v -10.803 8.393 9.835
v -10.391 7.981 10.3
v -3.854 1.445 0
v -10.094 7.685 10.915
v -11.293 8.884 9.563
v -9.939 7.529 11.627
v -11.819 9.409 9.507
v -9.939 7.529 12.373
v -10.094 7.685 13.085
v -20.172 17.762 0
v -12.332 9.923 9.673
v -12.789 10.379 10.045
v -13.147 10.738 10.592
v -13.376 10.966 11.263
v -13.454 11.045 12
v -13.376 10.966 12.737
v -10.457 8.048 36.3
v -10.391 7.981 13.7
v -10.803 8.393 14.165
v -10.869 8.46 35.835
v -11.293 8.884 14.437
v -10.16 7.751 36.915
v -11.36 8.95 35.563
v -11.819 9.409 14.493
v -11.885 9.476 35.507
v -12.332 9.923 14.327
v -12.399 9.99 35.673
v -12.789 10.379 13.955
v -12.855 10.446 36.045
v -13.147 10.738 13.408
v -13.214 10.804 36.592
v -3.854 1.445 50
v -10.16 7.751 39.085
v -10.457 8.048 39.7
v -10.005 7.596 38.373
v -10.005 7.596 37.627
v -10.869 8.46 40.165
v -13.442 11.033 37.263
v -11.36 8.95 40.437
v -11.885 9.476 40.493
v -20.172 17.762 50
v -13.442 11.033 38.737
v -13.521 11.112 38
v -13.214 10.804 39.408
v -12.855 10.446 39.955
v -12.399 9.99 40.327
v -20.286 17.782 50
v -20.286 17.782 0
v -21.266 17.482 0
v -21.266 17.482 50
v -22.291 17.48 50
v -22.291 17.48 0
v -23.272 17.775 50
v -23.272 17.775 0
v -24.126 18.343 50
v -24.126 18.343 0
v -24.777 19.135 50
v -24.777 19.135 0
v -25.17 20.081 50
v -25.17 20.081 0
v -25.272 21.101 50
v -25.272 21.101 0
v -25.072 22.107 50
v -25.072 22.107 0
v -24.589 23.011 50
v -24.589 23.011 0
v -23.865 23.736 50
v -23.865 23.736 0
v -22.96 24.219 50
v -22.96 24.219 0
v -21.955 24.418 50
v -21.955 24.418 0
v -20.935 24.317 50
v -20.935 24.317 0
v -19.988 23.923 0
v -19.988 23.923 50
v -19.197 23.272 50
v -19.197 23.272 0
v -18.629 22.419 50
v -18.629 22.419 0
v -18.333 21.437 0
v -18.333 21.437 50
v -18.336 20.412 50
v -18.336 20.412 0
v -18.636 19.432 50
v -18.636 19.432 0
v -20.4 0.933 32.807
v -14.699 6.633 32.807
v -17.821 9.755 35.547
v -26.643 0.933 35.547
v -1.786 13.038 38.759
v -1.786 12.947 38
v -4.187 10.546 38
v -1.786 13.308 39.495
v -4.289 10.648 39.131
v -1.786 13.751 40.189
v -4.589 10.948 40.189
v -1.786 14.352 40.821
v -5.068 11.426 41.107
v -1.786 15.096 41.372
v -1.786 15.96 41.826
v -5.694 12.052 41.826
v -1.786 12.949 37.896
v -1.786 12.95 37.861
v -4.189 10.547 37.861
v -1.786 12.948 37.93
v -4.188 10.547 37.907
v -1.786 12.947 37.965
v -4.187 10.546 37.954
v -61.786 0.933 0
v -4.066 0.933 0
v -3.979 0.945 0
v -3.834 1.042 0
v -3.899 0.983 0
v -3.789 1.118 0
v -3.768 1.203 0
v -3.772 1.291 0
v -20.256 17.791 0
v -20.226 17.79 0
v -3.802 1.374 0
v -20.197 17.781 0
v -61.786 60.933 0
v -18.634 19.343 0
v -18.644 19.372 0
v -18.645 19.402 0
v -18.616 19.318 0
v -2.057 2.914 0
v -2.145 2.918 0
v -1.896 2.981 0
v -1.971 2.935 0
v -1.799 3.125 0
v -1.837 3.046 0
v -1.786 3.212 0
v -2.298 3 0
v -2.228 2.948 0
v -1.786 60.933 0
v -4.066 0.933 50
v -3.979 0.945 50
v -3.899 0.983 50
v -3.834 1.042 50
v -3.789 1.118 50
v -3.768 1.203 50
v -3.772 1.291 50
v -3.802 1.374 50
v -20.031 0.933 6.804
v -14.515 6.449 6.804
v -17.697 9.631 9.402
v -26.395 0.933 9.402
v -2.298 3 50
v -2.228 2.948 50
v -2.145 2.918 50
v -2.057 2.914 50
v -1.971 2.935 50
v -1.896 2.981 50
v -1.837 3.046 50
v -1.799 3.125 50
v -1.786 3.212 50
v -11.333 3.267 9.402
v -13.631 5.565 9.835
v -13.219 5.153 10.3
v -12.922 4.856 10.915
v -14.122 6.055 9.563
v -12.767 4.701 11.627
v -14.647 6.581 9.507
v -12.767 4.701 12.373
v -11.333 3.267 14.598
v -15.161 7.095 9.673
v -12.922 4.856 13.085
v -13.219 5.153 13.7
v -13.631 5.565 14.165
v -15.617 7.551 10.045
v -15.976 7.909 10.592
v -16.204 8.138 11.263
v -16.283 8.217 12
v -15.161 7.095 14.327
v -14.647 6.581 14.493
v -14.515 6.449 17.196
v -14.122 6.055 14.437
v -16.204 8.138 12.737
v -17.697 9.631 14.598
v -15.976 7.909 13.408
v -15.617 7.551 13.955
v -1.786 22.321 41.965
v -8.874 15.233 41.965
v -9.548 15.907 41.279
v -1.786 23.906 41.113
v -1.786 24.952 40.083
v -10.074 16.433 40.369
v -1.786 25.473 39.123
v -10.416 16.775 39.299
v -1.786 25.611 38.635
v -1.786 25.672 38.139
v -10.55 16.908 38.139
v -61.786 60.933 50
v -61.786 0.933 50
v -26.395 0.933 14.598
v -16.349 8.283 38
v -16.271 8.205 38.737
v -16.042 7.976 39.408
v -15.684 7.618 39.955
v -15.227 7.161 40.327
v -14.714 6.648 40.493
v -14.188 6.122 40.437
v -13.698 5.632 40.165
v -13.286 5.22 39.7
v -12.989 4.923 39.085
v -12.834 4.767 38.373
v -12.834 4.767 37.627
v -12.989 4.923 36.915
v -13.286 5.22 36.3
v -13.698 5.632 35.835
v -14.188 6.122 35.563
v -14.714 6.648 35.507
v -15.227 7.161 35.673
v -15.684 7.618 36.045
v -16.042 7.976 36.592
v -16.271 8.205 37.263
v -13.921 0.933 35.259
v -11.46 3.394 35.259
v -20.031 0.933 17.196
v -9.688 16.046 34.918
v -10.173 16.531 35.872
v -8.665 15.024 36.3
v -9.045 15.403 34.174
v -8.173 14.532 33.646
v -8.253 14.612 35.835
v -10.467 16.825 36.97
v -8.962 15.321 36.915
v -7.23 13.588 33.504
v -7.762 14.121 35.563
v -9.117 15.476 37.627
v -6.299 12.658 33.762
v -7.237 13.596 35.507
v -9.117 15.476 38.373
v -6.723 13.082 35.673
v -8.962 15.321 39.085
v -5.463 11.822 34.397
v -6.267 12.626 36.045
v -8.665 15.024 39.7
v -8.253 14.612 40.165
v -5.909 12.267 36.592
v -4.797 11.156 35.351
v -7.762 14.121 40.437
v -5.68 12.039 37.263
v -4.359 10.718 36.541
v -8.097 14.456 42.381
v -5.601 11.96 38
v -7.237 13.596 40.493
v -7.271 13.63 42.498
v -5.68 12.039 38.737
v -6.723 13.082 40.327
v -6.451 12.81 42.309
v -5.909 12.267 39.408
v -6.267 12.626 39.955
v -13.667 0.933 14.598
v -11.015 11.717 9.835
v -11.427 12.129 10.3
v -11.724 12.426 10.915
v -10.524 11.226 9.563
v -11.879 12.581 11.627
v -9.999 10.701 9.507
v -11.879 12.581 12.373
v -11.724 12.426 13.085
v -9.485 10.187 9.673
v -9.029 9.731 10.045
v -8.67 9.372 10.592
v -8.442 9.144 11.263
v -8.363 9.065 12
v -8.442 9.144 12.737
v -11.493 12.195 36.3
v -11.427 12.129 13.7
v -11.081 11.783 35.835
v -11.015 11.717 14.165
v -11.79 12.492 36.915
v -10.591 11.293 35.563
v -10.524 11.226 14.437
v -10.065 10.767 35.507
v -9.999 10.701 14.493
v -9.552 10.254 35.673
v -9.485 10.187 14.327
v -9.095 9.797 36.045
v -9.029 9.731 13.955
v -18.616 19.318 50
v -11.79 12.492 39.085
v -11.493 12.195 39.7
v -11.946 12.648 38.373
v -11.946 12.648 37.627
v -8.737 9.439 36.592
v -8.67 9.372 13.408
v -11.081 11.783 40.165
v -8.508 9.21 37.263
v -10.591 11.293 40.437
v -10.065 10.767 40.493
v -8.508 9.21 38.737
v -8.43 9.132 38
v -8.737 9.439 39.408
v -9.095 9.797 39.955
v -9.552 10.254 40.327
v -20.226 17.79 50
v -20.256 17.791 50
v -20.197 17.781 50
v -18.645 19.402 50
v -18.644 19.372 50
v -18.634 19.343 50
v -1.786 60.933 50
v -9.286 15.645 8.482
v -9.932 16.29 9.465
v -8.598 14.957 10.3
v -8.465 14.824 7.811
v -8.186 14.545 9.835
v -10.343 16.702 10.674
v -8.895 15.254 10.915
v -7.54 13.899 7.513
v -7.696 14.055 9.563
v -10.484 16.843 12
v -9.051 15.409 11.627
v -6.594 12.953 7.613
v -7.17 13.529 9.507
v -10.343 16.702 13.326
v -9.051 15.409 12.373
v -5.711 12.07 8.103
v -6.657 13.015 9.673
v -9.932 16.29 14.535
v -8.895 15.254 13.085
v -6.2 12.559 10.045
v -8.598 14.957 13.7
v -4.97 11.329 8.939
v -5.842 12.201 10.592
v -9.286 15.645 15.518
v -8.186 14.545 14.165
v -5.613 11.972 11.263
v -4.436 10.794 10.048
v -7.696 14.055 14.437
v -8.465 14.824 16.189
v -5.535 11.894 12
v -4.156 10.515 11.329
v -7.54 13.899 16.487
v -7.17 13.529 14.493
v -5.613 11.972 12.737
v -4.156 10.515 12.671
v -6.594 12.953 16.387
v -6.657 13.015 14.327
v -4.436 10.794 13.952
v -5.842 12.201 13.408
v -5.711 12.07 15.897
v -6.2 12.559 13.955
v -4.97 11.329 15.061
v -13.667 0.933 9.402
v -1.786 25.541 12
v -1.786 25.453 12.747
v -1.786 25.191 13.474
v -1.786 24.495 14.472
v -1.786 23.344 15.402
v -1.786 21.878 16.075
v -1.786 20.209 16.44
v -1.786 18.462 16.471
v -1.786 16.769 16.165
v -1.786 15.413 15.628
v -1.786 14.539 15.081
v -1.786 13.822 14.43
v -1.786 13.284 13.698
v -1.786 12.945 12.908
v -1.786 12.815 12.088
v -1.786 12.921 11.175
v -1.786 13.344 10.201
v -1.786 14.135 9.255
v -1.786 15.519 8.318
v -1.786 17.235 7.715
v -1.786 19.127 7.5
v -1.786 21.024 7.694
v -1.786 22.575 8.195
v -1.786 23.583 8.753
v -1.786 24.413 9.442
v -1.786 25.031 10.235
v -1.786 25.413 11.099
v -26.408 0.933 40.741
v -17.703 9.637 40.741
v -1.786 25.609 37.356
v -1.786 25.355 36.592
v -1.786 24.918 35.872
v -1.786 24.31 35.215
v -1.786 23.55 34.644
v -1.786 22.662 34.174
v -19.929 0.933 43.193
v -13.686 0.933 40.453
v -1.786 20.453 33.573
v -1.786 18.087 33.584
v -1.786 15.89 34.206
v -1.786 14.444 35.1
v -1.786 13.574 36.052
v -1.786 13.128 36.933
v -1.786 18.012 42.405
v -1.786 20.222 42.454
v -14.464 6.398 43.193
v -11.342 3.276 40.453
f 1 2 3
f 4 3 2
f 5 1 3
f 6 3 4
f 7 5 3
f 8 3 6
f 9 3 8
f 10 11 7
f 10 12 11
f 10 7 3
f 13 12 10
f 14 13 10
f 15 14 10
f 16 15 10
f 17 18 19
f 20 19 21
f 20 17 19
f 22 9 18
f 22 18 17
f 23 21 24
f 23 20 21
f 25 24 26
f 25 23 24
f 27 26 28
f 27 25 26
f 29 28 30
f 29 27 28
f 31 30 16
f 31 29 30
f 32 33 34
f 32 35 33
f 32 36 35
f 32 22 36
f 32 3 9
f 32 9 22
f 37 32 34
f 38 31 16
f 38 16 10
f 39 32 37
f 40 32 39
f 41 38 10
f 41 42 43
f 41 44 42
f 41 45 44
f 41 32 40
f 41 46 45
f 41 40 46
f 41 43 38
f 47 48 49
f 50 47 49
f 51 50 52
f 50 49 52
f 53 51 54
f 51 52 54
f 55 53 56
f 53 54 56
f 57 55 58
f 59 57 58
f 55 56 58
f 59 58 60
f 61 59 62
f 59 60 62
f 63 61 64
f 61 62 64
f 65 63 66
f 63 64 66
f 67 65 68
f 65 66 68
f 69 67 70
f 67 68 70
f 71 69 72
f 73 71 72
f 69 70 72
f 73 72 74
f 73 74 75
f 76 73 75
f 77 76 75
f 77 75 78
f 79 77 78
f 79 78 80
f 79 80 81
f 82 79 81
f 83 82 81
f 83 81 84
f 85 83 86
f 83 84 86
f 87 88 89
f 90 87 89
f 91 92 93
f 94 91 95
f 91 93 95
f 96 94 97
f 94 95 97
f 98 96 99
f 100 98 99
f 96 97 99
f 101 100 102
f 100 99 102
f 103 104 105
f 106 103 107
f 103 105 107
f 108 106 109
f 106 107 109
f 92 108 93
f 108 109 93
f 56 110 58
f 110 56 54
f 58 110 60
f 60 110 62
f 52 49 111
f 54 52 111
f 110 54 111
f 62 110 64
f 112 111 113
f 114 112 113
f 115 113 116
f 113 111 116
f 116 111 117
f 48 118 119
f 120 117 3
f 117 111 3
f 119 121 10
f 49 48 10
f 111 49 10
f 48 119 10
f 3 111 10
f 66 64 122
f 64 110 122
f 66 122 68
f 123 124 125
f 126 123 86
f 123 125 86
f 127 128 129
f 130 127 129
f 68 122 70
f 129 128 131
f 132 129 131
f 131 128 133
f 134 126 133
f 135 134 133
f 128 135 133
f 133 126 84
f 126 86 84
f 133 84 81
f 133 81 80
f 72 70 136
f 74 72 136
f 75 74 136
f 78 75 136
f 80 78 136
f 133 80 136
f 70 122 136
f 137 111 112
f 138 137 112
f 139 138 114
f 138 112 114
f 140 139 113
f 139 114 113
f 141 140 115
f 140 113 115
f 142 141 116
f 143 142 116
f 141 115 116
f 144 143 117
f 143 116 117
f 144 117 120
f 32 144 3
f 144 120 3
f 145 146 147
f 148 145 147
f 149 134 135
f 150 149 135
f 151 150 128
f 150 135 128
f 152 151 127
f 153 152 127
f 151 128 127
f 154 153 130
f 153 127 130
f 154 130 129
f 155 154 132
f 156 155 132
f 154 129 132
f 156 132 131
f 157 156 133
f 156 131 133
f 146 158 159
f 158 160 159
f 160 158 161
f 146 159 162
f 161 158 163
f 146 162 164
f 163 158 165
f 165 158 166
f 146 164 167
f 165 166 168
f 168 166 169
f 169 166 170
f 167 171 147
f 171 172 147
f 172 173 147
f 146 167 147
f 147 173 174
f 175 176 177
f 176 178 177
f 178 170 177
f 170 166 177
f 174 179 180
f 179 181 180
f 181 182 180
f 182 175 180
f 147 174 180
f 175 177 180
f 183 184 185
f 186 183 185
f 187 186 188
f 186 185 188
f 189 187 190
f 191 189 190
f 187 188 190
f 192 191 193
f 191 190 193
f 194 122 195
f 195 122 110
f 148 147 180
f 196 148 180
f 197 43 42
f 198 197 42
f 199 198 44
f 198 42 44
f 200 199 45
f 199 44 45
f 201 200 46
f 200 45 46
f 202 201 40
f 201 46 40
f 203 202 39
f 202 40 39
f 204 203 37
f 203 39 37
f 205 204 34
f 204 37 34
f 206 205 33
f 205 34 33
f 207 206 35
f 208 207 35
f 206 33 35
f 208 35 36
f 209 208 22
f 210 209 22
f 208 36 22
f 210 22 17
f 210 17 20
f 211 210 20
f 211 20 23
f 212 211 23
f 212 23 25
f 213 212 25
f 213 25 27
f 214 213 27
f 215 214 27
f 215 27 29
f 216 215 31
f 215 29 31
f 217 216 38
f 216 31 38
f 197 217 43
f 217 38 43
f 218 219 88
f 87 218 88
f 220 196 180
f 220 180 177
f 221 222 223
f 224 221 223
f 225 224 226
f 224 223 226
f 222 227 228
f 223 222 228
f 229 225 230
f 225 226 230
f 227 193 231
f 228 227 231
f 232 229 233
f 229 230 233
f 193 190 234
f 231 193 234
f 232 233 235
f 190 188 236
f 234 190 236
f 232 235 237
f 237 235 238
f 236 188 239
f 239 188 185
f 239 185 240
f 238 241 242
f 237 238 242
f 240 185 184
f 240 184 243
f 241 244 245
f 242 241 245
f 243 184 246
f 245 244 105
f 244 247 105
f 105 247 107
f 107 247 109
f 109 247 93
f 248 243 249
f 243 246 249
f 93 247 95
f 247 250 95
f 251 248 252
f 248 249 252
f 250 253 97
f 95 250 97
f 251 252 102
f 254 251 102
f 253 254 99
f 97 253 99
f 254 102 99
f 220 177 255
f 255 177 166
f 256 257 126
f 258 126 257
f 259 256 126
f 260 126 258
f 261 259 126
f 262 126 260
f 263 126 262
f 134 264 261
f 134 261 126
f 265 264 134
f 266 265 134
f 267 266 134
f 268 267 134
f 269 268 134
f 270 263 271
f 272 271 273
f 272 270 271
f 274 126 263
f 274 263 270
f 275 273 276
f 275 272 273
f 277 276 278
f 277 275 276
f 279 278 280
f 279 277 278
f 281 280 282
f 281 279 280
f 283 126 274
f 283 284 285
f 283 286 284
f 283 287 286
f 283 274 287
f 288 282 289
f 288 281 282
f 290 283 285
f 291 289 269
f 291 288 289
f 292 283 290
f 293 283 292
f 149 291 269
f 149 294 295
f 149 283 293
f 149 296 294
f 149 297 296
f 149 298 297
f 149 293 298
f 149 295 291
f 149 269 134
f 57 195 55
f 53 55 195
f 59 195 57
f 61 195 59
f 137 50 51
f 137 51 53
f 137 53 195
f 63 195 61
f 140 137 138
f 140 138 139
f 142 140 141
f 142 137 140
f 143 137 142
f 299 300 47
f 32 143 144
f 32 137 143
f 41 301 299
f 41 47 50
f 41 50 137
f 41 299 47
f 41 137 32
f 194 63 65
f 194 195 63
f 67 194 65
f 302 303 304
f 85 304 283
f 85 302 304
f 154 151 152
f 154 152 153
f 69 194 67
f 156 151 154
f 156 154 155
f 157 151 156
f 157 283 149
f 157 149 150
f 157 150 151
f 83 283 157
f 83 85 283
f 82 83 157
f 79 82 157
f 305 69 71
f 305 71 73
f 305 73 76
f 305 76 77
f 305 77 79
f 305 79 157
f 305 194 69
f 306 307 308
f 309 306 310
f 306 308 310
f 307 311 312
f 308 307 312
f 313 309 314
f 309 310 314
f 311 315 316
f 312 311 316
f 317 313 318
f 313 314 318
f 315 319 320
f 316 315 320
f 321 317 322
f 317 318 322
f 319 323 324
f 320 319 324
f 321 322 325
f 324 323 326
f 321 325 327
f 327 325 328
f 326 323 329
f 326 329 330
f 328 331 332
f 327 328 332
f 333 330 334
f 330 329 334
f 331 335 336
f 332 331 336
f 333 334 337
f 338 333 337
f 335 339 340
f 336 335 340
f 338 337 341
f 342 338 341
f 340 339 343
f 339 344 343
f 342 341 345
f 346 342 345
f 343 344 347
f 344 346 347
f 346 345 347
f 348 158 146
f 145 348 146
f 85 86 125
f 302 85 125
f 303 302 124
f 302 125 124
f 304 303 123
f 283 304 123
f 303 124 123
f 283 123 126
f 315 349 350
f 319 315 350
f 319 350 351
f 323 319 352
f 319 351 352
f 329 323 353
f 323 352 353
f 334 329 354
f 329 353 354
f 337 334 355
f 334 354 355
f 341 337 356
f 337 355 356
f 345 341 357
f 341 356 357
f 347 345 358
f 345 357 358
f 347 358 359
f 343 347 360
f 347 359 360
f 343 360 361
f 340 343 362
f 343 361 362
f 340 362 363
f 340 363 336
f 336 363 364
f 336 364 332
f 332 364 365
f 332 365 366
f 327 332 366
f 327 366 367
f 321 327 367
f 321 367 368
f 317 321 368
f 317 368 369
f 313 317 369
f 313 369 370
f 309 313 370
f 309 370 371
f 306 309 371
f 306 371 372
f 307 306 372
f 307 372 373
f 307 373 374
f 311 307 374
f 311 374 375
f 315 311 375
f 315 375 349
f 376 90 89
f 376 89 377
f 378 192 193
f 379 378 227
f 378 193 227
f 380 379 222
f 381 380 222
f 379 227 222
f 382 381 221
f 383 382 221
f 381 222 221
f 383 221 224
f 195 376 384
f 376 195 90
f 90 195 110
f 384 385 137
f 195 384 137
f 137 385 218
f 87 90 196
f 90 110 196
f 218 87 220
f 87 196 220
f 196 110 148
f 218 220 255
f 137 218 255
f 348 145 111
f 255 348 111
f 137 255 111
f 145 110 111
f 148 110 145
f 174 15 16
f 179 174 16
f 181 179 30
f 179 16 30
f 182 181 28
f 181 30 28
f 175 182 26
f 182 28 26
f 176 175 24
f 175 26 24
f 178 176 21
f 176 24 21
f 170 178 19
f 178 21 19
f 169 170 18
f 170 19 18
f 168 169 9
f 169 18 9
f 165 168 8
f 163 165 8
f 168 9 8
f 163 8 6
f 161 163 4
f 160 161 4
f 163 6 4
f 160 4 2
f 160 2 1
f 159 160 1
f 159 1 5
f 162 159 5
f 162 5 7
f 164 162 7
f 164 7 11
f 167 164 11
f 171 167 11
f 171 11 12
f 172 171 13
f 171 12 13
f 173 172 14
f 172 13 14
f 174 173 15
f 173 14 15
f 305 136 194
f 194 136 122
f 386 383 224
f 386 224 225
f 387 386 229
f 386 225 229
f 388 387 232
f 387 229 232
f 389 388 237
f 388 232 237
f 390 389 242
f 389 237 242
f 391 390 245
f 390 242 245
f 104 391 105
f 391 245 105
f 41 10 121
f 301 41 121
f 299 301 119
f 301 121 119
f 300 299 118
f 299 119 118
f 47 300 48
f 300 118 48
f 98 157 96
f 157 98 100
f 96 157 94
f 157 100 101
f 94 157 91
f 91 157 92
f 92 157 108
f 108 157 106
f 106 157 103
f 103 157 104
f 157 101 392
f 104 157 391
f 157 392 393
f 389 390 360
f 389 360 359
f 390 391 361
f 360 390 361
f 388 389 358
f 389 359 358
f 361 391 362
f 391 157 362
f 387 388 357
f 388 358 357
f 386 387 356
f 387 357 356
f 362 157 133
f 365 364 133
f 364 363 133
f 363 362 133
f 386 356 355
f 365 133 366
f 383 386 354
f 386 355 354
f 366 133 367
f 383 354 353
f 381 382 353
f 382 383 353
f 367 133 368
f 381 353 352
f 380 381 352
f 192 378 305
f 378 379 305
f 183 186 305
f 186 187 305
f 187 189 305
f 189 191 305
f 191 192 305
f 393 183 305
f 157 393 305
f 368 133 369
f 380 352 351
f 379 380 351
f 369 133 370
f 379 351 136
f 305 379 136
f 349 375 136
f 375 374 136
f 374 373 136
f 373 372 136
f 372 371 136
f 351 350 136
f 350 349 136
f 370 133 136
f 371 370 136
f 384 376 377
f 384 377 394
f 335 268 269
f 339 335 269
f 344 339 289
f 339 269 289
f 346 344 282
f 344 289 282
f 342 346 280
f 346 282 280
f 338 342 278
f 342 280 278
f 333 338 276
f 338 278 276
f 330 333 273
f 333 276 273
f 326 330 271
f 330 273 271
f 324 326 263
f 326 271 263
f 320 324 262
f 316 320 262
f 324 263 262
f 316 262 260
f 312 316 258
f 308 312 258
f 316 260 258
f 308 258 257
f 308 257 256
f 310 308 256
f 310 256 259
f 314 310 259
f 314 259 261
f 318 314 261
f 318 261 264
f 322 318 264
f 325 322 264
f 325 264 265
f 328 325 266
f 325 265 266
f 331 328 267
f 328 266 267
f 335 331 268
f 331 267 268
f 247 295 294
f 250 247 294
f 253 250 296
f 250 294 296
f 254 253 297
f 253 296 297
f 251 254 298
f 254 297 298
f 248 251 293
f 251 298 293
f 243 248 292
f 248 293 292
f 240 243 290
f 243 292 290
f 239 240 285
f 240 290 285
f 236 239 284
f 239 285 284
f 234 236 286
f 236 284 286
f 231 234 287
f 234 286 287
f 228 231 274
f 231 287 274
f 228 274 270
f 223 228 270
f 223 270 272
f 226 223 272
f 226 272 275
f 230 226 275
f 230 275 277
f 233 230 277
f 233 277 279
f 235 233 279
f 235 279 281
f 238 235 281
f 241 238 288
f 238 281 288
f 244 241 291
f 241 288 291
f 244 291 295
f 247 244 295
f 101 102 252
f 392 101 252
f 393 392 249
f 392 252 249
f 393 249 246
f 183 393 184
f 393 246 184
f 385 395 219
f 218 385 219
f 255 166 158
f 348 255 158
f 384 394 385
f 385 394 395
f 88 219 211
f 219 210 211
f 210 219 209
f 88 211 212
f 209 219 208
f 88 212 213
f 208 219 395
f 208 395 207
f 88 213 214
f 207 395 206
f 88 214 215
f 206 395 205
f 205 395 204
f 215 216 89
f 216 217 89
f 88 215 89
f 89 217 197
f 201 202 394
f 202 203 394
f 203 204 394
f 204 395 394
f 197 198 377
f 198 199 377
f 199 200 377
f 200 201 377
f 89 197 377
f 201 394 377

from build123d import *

# Parameters (mm, degrees)
F1_DEPTH  = 50
F3_D      = 5
F3_DEPTH  = 41.3274068712
F4_D      = 5
F2_R      = 2.5
F5_DEPTH  = 25
F7_DEPTH  = 4
F8_D      = 5
F8_DEPTH  = 43.5274068712
F9_R      = 2.5
F10_DEPTH = 25
F11_DEPTH = 4
F12_D     = 9
F2_R_2    = 4.5
F13_DEPTH = 4
F14_DEPTH = 4


with BuildPart() as f1:
    # F0 (on Top) → F1 (new body)
    with BuildSketch(Plane.XY):
        with BuildLine():
            Line((-1.7862601951, 60.9325501156), (-61.7862601951, 60.9325501156))
            Line((-61.7862601951, 60.9325501156), (-61.7862601951, 0.9325501156))
            Line((-61.7862601951, 0.9325501156), (-4.0661591824, 0.9325501156))
            ThreePointArc((-4.0661591824, 0.9325501156), (-3.7889953226, 1.1177450859), (-3.854027148, 1.4446821499))
            Line((-3.854027148, 1.4446821499), (-20.1718328565, 17.7624878584))
            ThreePointArc((-20.1718328565, 17.7624878584), (-20.2255831505, 17.7903284125), (-20.2855480525, 17.7820579171))
            ThreePointArc((-20.2855480525, 17.7820579171), (-24.2538235709, 23.4001134914), (-18.6357679966, 19.431837973))
            ThreePointArc((-18.6357679966, 19.431837973), (-18.644038492, 19.371873071), (-18.6161979379, 19.318122777))
            Line((-18.6161979379, 19.318122777), (-2.2983922294, 3.0003170685))
            ThreePointArc((-2.2983922294, 3.0003170685), (-1.9714551654, 2.9352852431), (-1.7862601951, 3.2124491029))
            Line((-1.7862601951, 3.2124491029), (-1.7862601951, 60.9325501156))
        make_face()
    extrude(amount=F1_DEPTH)

    # F3 (through all, one way)
    with BuildSketch(Plane(origin=(0.3509624196, 0.3509624196, 0), x_dir=(0.7071067812, -0.7071067812, 0), z_dir=(-0.7071067812, -0.7071067812, 0))):
        with Locations((-14.9178623246, 38)):
            Circle(F3_D / 2)
    extrude(amount=-F3_DEPTH, mode=Mode.SUBTRACT)

    # F4 (through all)
    with Locations(Plane(origin=(0.3509624196, 0.3509624196, 0), x_dir=(0.7071067812, -0.7071067812, 0), z_dir=(0.7071067812, 0.7071067812, 0))):
        with Locations((-14.9178623246, -38)):
            Hole(F4_D / 2)


with BuildPart() as f5:
    # F2 (on face) → F5 (new body)
    with BuildSketch(Plane(origin=(0.3509624196, 0.3509624196, 0), x_dir=(0.7071067812, -0.7071067812, 0), z_dir=(-0.7071067812, -0.7071067812, 0))):
        with BuildLine():
            ThreePointArc((-10.4200142309, 37.8608507059), (-10.4184003334, 37.9304170338), (-10.4178623246, 38))
            ThreePointArc((-10.4178623246, 38), (-10.9864224448, 40.1894703631), (-12.5484314228, 41.825676045))
            ThreePointArc((-12.5484314228, 41.825676045), (-14.778713123, 42.4978480966), (-17.0462797434, 41.9648252536))
            ThreePointArc((-17.0462797434, 41.9648252536), (-18.7435384475, 40.3694307761), (-19.4157104183, 38.1391492941))
            ThreePointArc((-19.4157104183, 38.1391492941), (-18.8826876493, 35.8715827137), (-17.2872930734, 34.1743238602))
            ThreePointArc((-17.2872930734, 34.1743238602), (-15.0570115589, 33.5021519045), (-12.789445122, 34.0351746304))
            ThreePointArc((-12.789445122, 34.0351746304), (-11.0921862663, 35.6305691196), (-10.4200142309, 37.8608507059))
        make_face()
        with Locations((-14.9178623246, 38)):
            Circle(F2_R, mode=Mode.SUBTRACT)
    extrude(amount=-F5_DEPTH)


with BuildPart() as f1_1:
    add(f1.part)

    # F6: cut F5
    add(f5.part, mode=Mode.SUBTRACT)

    # F2 (on face) → F7 (join)
    with BuildSketch(Plane(origin=(0.3509624196, 0.3509624196, 0), x_dir=(0.7071067812, -0.7071067812, 0), z_dir=(-0.7071067812, -0.7071067812, 0))):
        with BuildLine():
            ThreePointArc((-10.4200142309, 37.8608507059), (-10.4184003334, 37.9304170338), (-10.4178623246, 38))
            ThreePointArc((-10.4178623246, 38), (-10.9864224448, 40.1894703631), (-12.5484314228, 41.825676045))
            ThreePointArc((-12.5484314228, 41.825676045), (-14.778713123, 42.4978480966), (-17.0462797434, 41.9648252536))
            ThreePointArc((-17.0462797434, 41.9648252536), (-18.7435384475, 40.3694307761), (-19.4157104183, 38.1391492941))
            ThreePointArc((-19.4157104183, 38.1391492941), (-18.8826876493, 35.8715827137), (-17.2872930734, 34.1743238602))
            ThreePointArc((-17.2872930734, 34.1743238602), (-15.0570115589, 33.5021519045), (-12.789445122, 34.0351746304))
            ThreePointArc((-12.789445122, 34.0351746304), (-11.0921862663, 35.6305691196), (-10.4200142309, 37.8608507059))
        make_face()
        with Locations((-14.9178623246, 38)):
            Circle(F2_R, mode=Mode.SUBTRACT)
    extrude(amount=-F7_DEPTH)

    # F8 (through all, one way)
    with BuildSketch(Plane(origin=(0.3509624196, 0.3509624196, 0), x_dir=(0.7071067812, -0.7071067812, 0), z_dir=(0.7071067812, 0.7071067812, 0))):
        with Locations((-14.8236154172, -12)):
            Circle(F8_D / 2)
    extrude(amount=-F8_DEPTH, mode=Mode.SUBTRACT)

    # F9 (on face) → F10 (cut)
    with BuildSketch(Plane(origin=(-1.2046724991, -1.2046724991, 0), x_dir=(-0.7071067812, 0.7071067812, 0), z_dir=(0.7071067812, 0.7071067812, 0))):
        Polygon((14.7514793048, 43.1934879119), (10.3369783488, 40.452652034), (10.5033613687, 35.2591641221), (15.0842453445, 32.8065120881), (19.4987463005, 35.547347966), (19.3323632806, 40.7408358779), align=None)
        with Locations((14.9178623246, 38)):
            Circle(F9_R, mode=Mode.SUBTRACT)
        Polygon((19.3236154172, 9.4019237886), (19.3236154172, 14.5980762114), (14.8236154172, 17.1961524227), (10.3236154172, 14.5980762114), (10.3236154172, 9.4019237886), (14.8236154172, 6.8038475773), align=None)
    extrude(amount=-F10_DEPTH, mode=Mode.SUBTRACT)

    # F9 (on face) → F11 (join)
    with BuildSketch(Plane(origin=(-1.2046724991, -1.2046724991, 0), x_dir=(-0.7071067812, 0.7071067812, 0), z_dir=(0.7071067812, 0.7071067812, 0))):
        Polygon((14.7514793048, 43.1934879119), (10.3369783488, 40.452652034), (10.5033613687, 35.2591641221), (15.0842453445, 32.8065120881), (19.4987463005, 35.547347966), (19.3323632806, 40.7408358779), align=None)
        with Locations((14.9178623246, 38)):
            Circle(F9_R, mode=Mode.SUBTRACT)
    extrude(amount=-F11_DEPTH)

    # F12 (through all)
    with Locations(Plane(origin=(0.3509624196, 0.3509624196, 0), x_dir=(0.7071067812, -0.7071067812, 0), z_dir=(-0.7071067812, -0.7071067812, 0))):
        with Locations((-14.8236154172, 12)):
            Hole(F12_D / 2)

    # F2 (on face) → F13 (join)
    with BuildSketch(Plane(origin=(0.3509624196, 0.3509624196, 0), x_dir=(0.7071067812, -0.7071067812, 0), z_dir=(-0.7071067812, -0.7071067812, 0))):
        with Locations((-14.8236154172, 12)):
            Circle(F2_R_2)
        with Locations((-14.8236154172, 12)):
            Circle(F2_R, mode=Mode.SUBTRACT)
    extrude(amount=-F13_DEPTH)

    # F9 (on face) → F14 (join)
    with BuildSketch(Plane(origin=(-1.2046724991, -1.2046724991, 0), x_dir=(-0.7071067812, 0.7071067812, 0), z_dir=(0.7071067812, 0.7071067812, 0))):
        Polygon((19.3236154172, 9.4019237886), (19.3236154172, 14.5980762114), (14.8236154172, 17.1961524227), (10.3236154172, 14.5980762114), (10.3236154172, 9.4019237886), (14.8236154172, 6.8038475773), align=None)
        with Locations((14.8236154172, 12)):
            Circle(F9_R, mode=Mode.SUBTRACT)
    extrude(amount=-F14_DEPTH)


solid = f1_1.part
